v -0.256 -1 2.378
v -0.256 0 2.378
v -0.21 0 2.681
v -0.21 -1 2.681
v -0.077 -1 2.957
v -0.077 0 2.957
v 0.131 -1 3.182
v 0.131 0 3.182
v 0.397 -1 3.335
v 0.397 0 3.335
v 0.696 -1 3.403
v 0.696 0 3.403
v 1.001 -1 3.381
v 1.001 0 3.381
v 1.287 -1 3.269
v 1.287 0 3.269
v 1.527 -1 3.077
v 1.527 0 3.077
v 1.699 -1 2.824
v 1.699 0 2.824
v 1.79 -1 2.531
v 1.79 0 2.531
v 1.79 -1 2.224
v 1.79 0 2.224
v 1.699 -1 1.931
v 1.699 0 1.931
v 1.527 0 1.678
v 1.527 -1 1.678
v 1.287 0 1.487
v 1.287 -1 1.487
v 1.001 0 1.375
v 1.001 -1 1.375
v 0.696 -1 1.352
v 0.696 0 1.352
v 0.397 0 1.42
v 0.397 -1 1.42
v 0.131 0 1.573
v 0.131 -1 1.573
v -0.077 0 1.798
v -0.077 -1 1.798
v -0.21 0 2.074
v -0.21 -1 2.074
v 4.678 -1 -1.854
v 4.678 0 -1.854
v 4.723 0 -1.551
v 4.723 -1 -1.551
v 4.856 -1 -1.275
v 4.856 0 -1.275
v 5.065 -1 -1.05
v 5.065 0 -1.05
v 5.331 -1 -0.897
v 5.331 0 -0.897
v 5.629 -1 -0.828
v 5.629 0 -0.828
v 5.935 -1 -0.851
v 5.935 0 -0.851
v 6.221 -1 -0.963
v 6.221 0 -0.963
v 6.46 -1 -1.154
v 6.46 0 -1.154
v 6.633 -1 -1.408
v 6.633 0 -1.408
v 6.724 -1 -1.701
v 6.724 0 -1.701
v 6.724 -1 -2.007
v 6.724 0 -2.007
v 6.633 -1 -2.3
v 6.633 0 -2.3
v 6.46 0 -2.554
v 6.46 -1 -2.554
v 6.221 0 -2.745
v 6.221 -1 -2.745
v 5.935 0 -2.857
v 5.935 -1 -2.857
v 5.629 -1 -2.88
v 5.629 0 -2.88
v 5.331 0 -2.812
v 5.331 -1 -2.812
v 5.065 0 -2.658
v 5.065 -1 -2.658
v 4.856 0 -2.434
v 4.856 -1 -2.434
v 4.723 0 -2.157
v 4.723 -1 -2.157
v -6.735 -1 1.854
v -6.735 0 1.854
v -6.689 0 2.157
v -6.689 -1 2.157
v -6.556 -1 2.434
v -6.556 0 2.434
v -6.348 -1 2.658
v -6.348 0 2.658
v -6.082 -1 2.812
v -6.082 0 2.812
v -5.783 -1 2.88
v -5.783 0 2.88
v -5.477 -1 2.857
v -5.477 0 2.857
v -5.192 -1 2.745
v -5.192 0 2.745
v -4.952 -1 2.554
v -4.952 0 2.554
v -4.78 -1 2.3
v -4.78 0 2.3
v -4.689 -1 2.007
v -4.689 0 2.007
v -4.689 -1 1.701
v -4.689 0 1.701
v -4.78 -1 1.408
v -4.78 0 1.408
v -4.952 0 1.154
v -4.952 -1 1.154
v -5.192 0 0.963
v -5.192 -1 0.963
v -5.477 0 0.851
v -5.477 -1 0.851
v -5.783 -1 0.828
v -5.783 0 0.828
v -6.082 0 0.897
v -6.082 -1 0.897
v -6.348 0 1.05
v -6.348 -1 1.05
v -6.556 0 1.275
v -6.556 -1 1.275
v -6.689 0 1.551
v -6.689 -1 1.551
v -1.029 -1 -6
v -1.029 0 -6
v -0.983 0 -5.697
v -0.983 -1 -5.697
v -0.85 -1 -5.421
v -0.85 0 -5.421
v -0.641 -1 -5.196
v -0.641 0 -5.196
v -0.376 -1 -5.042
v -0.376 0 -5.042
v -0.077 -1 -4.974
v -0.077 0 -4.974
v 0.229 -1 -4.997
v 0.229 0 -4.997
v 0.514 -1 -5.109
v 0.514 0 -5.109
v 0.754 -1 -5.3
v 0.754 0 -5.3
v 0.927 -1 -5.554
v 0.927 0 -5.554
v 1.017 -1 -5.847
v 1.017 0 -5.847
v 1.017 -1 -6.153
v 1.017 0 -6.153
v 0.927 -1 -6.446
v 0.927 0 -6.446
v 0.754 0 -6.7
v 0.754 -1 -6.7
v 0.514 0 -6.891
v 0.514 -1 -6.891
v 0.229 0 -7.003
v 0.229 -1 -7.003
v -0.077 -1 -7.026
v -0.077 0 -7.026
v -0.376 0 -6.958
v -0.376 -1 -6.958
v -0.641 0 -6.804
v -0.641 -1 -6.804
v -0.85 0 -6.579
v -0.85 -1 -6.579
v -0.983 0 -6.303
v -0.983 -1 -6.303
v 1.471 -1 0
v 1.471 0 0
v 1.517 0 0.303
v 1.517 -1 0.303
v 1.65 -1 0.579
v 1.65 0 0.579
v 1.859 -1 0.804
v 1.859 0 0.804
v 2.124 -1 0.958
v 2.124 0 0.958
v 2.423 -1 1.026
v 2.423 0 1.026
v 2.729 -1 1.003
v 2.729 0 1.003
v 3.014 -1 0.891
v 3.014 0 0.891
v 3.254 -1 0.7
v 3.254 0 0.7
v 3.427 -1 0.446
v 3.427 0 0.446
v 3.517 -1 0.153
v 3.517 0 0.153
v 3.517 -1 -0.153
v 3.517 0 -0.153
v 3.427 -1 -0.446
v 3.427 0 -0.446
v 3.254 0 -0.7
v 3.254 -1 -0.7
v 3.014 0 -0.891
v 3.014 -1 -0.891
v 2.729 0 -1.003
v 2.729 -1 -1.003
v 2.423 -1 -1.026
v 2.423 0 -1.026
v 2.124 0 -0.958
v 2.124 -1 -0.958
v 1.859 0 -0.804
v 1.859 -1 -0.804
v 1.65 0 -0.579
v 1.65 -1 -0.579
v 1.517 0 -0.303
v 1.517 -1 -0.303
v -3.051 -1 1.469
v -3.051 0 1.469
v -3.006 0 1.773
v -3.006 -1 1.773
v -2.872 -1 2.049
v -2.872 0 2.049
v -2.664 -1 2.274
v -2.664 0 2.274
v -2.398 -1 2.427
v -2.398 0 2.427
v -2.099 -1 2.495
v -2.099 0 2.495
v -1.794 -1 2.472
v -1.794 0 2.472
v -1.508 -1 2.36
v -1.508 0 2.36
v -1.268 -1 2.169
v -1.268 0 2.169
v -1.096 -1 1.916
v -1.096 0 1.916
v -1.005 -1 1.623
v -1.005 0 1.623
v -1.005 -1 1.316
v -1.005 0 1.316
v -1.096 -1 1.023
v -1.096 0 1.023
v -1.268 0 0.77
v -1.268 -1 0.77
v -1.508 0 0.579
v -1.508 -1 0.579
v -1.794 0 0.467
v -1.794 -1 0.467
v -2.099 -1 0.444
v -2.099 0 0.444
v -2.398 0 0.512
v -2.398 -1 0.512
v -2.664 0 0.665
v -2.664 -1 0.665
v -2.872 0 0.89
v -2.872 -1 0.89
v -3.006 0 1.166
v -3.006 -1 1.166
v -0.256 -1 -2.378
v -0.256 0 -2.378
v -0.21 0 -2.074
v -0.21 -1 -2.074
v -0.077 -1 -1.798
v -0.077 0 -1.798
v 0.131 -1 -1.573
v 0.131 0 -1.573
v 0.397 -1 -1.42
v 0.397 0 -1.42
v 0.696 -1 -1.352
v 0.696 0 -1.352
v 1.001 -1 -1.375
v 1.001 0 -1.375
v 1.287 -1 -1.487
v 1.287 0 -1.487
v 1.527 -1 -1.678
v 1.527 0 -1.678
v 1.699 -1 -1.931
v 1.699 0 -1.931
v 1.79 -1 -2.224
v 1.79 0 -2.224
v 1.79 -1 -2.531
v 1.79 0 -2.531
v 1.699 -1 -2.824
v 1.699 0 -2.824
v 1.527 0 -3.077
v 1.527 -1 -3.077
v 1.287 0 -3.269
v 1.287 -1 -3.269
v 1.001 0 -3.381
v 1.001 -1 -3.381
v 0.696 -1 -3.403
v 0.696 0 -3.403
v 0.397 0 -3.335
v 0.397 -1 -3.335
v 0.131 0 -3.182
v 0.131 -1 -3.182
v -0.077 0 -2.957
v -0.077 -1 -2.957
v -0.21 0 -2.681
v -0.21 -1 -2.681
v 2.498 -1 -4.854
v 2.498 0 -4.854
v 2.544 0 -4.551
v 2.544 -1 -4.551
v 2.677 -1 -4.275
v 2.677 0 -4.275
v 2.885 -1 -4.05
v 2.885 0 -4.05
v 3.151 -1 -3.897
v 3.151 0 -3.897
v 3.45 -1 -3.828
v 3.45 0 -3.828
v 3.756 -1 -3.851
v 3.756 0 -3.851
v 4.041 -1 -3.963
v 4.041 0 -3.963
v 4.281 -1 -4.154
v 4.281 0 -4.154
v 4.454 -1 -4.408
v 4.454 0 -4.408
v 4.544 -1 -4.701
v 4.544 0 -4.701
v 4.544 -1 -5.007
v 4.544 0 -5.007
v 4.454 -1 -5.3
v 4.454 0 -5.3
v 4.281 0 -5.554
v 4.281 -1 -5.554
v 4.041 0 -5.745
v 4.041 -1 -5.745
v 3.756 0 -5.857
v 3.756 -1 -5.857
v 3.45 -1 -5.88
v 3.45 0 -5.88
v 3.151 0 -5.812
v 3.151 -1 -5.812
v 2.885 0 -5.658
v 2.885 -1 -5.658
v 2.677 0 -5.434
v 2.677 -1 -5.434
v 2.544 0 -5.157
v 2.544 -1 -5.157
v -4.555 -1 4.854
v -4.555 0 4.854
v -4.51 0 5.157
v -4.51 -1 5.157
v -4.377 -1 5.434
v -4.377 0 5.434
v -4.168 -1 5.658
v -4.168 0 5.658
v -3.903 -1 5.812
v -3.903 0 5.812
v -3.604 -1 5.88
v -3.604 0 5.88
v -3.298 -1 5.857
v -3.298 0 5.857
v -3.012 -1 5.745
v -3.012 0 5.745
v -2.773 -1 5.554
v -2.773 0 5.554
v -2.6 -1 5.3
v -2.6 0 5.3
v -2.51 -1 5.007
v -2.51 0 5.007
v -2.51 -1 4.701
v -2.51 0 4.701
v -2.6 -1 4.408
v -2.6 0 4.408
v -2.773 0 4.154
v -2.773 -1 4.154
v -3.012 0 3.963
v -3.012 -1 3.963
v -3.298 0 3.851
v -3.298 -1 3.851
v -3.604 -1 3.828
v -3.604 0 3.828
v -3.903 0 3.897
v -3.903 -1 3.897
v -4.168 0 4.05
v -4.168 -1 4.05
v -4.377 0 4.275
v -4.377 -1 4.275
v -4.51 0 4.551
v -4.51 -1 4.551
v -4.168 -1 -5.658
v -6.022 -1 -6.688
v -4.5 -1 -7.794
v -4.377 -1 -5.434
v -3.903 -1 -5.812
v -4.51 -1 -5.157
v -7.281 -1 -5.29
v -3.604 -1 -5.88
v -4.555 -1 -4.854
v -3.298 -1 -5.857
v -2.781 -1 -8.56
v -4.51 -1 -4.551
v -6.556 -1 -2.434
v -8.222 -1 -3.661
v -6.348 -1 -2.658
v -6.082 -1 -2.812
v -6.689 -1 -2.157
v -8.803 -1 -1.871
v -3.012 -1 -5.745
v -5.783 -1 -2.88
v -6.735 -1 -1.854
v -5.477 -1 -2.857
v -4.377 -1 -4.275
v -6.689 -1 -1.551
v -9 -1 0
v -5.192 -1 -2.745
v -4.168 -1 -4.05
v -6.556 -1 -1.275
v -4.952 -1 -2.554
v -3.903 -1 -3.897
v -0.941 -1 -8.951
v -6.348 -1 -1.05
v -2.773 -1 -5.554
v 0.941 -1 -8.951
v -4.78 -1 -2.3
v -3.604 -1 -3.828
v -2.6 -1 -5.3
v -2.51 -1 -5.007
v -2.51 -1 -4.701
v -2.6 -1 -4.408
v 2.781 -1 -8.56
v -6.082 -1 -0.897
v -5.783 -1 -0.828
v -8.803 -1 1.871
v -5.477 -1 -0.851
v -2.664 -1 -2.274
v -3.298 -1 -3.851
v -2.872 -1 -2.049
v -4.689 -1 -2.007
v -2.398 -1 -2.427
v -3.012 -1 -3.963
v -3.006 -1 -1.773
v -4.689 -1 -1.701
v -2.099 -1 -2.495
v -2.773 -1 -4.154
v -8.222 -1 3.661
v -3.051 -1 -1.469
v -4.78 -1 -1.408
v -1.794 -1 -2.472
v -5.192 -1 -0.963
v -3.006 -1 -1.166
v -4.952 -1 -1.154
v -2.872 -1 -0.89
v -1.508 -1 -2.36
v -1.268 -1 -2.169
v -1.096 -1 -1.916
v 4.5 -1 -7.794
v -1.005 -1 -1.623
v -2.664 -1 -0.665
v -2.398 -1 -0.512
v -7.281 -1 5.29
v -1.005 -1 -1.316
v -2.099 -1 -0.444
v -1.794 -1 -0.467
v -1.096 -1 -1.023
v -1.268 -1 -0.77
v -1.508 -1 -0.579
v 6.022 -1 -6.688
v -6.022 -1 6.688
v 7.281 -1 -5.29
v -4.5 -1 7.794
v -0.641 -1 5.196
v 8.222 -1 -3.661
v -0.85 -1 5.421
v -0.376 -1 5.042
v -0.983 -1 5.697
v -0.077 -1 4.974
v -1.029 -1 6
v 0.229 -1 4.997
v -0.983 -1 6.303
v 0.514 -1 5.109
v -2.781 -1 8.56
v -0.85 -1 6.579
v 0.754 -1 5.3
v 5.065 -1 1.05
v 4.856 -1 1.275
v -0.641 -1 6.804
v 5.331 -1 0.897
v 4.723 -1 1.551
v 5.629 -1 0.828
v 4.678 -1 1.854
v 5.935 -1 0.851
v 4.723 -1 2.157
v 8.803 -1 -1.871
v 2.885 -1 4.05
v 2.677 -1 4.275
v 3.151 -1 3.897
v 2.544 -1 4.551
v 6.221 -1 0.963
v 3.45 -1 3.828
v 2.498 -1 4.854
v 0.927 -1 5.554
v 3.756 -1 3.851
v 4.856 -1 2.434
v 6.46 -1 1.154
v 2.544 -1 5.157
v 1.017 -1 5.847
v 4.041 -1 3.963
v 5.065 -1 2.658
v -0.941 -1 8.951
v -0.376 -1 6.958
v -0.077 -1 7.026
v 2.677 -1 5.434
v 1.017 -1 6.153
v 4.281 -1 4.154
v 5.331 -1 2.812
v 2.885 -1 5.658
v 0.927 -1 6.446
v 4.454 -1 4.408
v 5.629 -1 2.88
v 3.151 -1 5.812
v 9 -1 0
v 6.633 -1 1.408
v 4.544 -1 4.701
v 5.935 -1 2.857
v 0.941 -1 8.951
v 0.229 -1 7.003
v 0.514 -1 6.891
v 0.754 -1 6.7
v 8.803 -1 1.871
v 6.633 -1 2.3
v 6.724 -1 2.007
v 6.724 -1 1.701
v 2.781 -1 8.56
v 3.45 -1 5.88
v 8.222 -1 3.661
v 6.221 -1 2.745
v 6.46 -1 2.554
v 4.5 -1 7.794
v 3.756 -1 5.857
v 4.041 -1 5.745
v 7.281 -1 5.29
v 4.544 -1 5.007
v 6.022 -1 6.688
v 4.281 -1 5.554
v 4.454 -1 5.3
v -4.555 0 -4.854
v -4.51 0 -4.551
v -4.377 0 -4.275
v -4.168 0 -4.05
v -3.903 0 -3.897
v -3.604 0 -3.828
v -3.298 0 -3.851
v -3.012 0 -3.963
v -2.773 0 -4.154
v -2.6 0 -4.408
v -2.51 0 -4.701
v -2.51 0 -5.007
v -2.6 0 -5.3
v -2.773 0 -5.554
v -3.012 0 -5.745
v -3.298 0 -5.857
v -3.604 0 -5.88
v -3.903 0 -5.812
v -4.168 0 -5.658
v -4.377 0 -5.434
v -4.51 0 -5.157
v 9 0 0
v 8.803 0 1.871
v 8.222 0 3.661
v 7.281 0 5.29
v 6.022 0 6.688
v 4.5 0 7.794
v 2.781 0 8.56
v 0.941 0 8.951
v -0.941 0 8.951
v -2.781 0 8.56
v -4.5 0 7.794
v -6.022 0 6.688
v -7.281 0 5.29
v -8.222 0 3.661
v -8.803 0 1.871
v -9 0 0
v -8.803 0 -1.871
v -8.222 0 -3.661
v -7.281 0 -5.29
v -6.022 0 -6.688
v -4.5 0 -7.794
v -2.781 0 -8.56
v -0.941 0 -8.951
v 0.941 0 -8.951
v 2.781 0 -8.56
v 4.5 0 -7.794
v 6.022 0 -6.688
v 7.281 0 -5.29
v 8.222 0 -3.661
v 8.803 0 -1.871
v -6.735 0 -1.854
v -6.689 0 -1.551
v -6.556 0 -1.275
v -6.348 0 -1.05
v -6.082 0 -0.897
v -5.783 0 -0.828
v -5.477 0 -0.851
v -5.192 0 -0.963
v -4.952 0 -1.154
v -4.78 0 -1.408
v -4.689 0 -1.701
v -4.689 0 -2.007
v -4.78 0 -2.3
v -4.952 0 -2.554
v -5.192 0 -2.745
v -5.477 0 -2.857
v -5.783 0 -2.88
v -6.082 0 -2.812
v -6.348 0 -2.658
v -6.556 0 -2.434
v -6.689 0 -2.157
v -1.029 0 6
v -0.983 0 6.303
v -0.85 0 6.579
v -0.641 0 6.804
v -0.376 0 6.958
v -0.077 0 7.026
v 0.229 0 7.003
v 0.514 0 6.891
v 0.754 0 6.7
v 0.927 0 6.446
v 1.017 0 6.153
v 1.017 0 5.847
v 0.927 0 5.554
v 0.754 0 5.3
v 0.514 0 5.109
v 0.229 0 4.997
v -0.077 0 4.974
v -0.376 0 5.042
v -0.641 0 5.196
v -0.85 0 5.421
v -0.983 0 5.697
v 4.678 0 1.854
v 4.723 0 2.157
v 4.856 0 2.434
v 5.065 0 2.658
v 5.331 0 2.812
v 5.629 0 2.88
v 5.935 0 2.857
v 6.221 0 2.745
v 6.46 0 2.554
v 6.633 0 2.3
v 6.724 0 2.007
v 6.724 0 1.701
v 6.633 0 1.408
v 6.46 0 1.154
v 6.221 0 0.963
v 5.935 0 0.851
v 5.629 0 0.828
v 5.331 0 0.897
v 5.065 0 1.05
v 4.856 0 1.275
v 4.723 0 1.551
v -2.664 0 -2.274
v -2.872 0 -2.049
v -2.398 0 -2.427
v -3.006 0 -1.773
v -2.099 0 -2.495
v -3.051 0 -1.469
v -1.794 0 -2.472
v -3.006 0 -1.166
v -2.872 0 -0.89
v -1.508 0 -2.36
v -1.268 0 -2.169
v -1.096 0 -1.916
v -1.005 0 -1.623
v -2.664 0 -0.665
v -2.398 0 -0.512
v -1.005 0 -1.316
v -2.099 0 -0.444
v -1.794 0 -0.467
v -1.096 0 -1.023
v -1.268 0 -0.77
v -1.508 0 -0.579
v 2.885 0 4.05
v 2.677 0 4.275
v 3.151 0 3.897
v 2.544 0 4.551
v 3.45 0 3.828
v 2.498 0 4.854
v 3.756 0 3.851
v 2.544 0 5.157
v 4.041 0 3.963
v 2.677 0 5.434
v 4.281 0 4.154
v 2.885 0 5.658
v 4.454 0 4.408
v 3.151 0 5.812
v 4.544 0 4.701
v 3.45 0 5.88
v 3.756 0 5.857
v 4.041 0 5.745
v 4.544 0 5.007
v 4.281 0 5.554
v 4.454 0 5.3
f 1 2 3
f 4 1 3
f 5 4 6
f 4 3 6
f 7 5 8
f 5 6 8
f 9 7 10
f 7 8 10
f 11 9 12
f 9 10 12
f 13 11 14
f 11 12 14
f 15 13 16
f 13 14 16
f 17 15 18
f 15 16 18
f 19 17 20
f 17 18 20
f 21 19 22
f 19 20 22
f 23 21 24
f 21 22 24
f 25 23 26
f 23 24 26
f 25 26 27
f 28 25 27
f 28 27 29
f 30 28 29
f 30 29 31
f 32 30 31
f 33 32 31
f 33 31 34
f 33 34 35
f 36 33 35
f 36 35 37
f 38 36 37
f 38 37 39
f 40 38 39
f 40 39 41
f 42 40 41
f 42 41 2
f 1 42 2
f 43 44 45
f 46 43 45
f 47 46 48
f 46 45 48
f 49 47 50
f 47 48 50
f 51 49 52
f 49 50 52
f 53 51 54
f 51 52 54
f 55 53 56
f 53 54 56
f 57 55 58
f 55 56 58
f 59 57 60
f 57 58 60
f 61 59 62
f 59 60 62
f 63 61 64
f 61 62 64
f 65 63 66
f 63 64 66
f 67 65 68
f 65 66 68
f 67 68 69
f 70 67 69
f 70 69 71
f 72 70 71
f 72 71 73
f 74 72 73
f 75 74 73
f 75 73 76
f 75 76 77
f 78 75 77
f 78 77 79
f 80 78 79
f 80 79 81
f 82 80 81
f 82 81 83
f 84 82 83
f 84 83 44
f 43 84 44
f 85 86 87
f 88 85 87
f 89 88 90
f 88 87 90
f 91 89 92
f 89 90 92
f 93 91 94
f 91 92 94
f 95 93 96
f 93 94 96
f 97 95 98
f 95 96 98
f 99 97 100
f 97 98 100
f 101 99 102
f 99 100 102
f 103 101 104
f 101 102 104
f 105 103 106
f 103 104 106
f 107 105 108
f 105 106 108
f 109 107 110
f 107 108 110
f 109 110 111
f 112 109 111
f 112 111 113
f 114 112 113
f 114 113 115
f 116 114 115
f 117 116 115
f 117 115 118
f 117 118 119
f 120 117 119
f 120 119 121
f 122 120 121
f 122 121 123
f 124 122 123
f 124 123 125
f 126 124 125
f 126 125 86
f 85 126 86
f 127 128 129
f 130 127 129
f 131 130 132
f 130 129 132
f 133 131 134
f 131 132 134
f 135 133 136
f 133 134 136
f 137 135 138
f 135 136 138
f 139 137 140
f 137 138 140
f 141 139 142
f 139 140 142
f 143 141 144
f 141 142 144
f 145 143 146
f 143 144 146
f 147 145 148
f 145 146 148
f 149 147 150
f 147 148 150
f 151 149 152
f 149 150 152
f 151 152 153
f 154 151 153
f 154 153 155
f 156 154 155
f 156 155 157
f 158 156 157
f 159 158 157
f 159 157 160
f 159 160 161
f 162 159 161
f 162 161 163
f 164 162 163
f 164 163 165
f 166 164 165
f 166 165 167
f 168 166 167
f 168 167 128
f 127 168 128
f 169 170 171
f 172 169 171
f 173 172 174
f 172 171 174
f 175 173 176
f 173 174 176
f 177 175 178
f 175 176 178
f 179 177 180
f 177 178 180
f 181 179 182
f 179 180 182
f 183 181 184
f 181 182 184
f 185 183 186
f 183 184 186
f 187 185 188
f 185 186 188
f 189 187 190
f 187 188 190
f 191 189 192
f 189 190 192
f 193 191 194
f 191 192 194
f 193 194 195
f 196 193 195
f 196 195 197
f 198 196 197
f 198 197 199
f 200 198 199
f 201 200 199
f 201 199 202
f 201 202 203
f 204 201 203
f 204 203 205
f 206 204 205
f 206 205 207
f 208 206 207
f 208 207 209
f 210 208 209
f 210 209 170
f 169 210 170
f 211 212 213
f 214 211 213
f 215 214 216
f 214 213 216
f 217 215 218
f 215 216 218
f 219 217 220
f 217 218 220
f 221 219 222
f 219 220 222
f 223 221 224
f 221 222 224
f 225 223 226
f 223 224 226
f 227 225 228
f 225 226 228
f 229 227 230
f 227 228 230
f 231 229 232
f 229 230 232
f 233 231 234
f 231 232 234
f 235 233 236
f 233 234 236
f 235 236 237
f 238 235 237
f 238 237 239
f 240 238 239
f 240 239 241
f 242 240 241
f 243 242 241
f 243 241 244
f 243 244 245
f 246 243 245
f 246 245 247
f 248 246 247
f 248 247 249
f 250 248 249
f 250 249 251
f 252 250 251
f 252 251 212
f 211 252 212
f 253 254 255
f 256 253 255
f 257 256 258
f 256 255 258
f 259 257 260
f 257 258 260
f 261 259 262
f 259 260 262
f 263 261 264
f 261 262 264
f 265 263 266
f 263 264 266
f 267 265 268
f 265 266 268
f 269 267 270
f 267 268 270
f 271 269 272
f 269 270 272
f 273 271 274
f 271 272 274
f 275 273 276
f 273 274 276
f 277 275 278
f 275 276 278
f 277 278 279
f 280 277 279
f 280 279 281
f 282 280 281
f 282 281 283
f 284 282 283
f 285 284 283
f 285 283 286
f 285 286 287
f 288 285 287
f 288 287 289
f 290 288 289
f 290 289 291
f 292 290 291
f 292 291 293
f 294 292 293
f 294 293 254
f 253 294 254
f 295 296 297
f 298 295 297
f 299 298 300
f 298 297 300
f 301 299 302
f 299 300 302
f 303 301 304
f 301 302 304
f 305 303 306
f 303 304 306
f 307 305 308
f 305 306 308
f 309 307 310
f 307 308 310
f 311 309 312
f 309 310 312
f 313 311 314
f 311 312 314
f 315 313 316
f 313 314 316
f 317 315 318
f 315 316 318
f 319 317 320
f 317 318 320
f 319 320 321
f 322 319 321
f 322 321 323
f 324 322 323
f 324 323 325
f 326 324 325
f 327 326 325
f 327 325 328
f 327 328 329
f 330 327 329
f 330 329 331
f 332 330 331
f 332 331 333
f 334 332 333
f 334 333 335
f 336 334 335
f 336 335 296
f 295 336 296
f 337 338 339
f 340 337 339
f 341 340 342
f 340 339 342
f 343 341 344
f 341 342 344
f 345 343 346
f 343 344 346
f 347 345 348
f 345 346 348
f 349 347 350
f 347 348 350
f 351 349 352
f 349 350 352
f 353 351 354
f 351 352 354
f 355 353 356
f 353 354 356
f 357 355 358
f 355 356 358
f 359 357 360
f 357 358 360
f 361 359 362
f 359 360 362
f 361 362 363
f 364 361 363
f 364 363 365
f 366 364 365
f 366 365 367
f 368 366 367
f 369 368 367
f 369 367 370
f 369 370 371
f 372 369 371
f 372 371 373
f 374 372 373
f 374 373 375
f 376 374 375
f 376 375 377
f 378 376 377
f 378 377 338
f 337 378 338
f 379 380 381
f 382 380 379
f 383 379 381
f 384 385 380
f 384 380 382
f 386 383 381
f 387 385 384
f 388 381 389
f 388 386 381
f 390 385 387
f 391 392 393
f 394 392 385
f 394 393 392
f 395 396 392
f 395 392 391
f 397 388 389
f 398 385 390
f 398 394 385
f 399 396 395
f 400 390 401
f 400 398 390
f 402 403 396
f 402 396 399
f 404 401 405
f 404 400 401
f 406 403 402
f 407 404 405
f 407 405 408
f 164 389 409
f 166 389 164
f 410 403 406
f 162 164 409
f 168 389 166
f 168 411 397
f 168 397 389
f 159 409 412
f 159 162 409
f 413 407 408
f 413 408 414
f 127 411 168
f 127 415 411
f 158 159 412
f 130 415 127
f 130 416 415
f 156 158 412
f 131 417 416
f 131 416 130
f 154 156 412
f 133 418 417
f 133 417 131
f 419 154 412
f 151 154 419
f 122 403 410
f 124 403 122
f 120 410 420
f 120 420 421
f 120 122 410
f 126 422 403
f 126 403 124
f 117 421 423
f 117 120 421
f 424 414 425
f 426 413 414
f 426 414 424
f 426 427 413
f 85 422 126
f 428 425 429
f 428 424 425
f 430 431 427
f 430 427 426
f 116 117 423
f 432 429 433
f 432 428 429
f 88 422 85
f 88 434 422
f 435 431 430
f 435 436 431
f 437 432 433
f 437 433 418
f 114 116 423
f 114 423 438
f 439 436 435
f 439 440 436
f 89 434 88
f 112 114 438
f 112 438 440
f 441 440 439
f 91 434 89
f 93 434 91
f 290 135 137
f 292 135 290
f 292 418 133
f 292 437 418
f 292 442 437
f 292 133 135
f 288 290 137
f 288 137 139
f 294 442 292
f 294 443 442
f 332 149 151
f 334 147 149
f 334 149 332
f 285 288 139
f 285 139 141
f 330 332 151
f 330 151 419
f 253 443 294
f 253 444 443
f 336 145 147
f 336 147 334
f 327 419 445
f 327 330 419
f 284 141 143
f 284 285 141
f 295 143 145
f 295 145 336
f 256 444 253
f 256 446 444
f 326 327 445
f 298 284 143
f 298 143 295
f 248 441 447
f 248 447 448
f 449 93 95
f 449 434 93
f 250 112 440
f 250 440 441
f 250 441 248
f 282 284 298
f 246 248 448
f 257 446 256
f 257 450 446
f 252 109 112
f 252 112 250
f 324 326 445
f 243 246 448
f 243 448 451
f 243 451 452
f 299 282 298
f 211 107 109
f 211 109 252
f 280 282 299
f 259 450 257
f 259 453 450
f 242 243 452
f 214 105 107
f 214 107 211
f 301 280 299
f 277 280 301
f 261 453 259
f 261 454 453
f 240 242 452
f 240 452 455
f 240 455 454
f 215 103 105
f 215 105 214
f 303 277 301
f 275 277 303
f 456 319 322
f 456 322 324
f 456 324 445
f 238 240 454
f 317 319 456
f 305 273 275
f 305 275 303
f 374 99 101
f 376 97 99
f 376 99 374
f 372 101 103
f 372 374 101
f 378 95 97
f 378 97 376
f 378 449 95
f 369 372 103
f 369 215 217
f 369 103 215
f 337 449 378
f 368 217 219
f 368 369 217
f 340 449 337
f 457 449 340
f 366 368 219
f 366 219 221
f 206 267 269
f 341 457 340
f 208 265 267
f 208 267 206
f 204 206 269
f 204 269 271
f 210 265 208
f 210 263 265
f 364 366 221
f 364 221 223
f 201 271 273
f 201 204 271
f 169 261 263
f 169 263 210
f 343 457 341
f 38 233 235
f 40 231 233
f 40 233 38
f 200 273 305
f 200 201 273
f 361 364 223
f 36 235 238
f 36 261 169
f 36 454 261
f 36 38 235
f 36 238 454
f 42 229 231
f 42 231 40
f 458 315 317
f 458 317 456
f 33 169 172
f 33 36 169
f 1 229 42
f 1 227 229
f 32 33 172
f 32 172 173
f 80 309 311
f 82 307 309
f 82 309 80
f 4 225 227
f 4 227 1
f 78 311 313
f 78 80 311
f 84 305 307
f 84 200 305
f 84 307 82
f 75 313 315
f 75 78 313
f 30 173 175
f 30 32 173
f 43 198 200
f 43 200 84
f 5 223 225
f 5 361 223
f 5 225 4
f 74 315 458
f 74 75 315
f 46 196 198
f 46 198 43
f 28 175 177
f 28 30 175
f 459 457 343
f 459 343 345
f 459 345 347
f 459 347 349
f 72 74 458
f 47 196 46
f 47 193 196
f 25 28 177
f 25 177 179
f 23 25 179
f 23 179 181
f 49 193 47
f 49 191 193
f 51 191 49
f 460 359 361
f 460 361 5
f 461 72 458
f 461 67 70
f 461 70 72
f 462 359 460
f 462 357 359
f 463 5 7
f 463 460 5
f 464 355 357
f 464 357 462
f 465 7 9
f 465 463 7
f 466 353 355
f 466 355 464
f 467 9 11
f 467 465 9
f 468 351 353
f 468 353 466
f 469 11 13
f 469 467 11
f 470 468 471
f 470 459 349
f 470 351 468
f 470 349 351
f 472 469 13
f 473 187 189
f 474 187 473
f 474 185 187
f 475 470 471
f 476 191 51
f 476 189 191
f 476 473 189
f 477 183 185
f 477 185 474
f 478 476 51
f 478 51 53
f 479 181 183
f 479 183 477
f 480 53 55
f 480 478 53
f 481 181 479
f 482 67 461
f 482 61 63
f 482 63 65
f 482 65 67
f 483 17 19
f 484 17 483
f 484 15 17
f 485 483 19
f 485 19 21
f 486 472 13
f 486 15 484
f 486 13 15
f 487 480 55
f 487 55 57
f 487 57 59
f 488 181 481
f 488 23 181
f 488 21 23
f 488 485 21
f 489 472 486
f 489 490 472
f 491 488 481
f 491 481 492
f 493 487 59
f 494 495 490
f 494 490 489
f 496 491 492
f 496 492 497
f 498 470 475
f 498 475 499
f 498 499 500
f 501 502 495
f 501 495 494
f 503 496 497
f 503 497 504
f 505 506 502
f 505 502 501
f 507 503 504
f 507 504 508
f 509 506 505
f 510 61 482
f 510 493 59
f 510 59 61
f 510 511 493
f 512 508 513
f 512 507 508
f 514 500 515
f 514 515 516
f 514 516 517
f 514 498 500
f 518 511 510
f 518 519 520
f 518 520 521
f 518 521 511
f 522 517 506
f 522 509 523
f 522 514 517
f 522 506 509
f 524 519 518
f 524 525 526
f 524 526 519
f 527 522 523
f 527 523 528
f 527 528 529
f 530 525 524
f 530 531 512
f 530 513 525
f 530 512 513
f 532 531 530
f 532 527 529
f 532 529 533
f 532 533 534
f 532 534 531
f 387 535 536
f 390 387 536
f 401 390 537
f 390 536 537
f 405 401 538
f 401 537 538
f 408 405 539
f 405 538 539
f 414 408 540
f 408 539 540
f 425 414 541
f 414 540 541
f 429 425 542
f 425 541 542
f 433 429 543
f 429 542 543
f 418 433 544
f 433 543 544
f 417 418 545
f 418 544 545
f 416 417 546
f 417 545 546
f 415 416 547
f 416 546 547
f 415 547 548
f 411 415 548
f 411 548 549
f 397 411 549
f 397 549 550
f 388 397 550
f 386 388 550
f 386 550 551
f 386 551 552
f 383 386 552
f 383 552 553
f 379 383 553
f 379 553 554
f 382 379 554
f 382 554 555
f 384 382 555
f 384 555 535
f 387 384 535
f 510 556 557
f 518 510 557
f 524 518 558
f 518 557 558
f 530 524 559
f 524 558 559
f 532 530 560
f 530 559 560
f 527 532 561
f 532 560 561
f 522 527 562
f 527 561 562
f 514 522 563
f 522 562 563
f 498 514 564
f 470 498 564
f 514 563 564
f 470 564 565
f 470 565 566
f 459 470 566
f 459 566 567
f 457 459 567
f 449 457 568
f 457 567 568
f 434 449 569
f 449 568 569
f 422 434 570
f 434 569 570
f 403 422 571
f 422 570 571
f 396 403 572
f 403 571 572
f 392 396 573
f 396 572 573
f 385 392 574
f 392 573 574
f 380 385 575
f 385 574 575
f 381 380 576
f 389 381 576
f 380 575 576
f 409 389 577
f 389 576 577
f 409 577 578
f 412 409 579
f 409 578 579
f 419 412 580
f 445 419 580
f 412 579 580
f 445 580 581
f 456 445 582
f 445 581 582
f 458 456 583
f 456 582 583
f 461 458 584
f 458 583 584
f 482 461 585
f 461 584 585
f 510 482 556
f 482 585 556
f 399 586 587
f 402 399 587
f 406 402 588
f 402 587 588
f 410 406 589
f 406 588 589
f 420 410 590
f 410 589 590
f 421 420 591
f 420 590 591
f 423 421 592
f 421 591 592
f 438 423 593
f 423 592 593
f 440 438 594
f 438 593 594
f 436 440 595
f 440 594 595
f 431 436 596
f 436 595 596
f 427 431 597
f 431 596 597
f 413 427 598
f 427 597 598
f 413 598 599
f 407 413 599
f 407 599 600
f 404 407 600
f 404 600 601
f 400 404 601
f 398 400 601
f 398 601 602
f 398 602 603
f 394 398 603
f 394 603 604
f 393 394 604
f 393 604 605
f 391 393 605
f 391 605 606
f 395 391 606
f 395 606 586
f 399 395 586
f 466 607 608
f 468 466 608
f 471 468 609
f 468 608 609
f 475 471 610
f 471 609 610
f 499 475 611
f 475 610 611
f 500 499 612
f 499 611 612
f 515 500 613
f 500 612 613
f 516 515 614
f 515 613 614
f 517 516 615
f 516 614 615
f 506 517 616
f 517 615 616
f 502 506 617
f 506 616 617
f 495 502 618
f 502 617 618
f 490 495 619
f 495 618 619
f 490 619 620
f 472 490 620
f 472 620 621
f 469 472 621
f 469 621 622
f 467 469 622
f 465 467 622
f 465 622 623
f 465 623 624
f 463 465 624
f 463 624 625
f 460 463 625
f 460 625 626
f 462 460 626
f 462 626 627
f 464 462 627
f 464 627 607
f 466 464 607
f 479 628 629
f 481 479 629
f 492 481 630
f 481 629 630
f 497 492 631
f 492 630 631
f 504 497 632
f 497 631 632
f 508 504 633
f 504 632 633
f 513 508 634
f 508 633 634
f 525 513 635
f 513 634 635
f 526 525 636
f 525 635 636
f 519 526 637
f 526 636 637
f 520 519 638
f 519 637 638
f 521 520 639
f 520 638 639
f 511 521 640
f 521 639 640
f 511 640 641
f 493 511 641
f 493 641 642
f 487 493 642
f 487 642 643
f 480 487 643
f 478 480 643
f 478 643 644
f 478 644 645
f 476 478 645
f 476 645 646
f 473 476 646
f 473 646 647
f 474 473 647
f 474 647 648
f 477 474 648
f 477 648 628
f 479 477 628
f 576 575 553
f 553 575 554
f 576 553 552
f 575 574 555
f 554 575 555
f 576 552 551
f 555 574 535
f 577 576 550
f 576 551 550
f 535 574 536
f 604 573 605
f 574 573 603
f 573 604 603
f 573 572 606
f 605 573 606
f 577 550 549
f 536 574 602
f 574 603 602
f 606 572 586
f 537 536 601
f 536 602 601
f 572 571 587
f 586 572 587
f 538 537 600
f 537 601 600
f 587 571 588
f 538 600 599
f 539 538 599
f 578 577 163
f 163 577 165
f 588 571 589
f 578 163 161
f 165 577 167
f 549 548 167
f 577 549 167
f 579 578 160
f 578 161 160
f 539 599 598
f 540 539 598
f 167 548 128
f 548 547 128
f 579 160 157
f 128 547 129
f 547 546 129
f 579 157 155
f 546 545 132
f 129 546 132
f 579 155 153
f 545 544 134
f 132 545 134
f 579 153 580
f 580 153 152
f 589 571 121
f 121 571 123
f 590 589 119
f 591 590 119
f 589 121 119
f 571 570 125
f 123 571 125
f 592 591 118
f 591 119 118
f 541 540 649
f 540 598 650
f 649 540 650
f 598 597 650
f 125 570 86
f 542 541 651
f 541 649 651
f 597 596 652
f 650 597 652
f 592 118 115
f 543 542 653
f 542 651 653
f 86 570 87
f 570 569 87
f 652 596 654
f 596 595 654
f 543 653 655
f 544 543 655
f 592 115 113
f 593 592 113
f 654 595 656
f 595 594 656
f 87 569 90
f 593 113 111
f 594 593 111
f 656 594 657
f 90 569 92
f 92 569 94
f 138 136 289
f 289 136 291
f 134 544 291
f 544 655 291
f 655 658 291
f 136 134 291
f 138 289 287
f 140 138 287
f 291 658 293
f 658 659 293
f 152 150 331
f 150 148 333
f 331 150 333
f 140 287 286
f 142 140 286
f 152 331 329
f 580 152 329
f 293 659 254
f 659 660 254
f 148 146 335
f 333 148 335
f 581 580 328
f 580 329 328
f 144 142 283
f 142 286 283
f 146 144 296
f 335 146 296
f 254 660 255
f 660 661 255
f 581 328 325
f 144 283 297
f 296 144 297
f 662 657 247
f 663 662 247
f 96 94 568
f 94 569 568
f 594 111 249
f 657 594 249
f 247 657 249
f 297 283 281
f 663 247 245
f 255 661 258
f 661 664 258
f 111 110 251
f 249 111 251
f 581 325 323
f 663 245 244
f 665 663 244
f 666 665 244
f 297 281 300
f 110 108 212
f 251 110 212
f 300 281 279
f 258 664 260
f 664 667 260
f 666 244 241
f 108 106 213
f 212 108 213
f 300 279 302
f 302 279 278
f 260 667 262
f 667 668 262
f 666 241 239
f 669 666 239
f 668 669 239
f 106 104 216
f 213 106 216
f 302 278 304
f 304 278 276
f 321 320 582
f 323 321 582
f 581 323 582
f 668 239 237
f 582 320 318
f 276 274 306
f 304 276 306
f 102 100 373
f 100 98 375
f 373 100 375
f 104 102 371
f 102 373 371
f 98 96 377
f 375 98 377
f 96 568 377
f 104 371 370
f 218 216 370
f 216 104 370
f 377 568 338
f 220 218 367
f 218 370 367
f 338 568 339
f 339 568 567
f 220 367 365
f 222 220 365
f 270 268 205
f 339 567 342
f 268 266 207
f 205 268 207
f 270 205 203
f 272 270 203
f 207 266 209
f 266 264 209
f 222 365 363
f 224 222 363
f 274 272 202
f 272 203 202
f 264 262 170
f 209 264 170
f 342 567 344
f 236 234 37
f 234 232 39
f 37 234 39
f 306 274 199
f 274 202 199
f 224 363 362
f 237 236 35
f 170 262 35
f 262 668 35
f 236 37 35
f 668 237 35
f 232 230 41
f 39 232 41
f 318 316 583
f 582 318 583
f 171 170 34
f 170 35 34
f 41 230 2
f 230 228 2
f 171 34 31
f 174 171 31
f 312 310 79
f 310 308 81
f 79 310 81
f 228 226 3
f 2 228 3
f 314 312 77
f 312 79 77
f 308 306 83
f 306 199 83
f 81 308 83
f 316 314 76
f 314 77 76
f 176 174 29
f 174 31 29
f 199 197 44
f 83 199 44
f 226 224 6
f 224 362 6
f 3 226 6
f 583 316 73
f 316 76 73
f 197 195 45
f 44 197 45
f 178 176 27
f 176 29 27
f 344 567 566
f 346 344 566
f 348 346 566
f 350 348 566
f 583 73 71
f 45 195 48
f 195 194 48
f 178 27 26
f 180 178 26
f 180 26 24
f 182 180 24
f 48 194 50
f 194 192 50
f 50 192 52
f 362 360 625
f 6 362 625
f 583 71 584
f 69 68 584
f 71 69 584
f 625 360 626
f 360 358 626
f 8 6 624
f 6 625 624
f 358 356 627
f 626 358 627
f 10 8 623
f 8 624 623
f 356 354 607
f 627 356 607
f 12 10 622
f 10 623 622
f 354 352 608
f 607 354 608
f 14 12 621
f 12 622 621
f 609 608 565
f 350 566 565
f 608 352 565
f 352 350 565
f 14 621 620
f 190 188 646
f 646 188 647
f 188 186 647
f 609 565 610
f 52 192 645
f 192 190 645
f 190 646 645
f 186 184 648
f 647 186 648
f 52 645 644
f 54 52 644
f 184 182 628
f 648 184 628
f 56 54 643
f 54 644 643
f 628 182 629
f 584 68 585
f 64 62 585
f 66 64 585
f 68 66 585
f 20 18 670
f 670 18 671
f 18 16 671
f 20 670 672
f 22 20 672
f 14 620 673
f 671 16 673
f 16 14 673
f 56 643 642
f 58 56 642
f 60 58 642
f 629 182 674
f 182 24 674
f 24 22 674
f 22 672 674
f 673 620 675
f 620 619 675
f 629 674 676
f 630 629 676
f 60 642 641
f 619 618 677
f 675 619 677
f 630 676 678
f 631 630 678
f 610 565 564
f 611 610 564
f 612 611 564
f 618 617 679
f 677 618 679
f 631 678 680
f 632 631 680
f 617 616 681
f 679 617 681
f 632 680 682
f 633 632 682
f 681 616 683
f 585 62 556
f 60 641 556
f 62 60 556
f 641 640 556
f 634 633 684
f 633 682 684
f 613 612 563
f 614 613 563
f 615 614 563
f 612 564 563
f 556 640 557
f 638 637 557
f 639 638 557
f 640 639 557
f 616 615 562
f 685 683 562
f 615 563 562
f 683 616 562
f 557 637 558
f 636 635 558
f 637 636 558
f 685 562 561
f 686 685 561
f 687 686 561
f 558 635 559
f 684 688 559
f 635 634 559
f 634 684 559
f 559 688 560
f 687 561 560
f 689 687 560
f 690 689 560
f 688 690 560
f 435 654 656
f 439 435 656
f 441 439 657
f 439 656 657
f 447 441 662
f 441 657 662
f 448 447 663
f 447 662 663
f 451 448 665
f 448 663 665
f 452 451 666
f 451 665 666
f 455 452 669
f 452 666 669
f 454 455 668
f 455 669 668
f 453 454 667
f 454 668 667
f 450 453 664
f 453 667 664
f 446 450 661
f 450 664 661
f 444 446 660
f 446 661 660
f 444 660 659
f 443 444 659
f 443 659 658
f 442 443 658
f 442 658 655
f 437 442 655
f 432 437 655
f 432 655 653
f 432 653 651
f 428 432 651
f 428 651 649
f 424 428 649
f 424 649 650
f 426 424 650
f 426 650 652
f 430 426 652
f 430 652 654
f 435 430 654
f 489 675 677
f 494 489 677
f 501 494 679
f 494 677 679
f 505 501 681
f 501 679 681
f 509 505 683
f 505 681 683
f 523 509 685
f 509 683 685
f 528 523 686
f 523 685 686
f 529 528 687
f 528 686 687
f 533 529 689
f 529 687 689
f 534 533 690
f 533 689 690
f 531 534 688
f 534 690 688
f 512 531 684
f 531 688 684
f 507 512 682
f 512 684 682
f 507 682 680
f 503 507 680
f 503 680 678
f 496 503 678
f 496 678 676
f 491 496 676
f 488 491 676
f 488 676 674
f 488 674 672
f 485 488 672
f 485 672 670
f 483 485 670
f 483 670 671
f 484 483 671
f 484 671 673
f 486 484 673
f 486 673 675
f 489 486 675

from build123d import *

# Parameters (mm, degrees)
F0_R     = 9
F1_DEPTH = 1
F3_D     = 2.0574
F3_DEPTH = 15
F3_TIP   = 0.6181053188


# Not quite as in the source:
# - a feature names something its author has since deleted; it is built from what else it names


with BuildPart() as f1:
    # F0 (on Front) → F1 (new body)
    with BuildSketch(Plane.XZ):
        Circle(F0_R)
    extrude(amount=F1_DEPTH)

    # F3
    with Locations(Plane.XZ.offset(1)):
        with Locations((-3.5267115138, 4.8541019662), (-5.7063390978, 1.8541019662), (-5.7063390978, -1.8541019662), (-3.5267115138, -4.8541019662), (0, -6), (3.5267115138, -4.8541019662), (5.7063390978, -1.8541019662), (0, 6), (-2.0225424859, 1.4694631307), (-2.0225424859, -1.4694631307), (0.7725424859, -2.3776412907), (2.5, 0), (0.7725424859, 2.3776412907), (3.5267115138, 4.8541019662), (5.7063390978, 1.8541019662)):
            Hole(F3_D / 2, depth=F3_DEPTH)
            with Locations((0, 0, -(F3_DEPTH + F3_TIP / 2))):  # 118° drill point
                Cone(0, F3_D / 2, F3_TIP, mode=Mode.SUBTRACT)


solid = f1.part
